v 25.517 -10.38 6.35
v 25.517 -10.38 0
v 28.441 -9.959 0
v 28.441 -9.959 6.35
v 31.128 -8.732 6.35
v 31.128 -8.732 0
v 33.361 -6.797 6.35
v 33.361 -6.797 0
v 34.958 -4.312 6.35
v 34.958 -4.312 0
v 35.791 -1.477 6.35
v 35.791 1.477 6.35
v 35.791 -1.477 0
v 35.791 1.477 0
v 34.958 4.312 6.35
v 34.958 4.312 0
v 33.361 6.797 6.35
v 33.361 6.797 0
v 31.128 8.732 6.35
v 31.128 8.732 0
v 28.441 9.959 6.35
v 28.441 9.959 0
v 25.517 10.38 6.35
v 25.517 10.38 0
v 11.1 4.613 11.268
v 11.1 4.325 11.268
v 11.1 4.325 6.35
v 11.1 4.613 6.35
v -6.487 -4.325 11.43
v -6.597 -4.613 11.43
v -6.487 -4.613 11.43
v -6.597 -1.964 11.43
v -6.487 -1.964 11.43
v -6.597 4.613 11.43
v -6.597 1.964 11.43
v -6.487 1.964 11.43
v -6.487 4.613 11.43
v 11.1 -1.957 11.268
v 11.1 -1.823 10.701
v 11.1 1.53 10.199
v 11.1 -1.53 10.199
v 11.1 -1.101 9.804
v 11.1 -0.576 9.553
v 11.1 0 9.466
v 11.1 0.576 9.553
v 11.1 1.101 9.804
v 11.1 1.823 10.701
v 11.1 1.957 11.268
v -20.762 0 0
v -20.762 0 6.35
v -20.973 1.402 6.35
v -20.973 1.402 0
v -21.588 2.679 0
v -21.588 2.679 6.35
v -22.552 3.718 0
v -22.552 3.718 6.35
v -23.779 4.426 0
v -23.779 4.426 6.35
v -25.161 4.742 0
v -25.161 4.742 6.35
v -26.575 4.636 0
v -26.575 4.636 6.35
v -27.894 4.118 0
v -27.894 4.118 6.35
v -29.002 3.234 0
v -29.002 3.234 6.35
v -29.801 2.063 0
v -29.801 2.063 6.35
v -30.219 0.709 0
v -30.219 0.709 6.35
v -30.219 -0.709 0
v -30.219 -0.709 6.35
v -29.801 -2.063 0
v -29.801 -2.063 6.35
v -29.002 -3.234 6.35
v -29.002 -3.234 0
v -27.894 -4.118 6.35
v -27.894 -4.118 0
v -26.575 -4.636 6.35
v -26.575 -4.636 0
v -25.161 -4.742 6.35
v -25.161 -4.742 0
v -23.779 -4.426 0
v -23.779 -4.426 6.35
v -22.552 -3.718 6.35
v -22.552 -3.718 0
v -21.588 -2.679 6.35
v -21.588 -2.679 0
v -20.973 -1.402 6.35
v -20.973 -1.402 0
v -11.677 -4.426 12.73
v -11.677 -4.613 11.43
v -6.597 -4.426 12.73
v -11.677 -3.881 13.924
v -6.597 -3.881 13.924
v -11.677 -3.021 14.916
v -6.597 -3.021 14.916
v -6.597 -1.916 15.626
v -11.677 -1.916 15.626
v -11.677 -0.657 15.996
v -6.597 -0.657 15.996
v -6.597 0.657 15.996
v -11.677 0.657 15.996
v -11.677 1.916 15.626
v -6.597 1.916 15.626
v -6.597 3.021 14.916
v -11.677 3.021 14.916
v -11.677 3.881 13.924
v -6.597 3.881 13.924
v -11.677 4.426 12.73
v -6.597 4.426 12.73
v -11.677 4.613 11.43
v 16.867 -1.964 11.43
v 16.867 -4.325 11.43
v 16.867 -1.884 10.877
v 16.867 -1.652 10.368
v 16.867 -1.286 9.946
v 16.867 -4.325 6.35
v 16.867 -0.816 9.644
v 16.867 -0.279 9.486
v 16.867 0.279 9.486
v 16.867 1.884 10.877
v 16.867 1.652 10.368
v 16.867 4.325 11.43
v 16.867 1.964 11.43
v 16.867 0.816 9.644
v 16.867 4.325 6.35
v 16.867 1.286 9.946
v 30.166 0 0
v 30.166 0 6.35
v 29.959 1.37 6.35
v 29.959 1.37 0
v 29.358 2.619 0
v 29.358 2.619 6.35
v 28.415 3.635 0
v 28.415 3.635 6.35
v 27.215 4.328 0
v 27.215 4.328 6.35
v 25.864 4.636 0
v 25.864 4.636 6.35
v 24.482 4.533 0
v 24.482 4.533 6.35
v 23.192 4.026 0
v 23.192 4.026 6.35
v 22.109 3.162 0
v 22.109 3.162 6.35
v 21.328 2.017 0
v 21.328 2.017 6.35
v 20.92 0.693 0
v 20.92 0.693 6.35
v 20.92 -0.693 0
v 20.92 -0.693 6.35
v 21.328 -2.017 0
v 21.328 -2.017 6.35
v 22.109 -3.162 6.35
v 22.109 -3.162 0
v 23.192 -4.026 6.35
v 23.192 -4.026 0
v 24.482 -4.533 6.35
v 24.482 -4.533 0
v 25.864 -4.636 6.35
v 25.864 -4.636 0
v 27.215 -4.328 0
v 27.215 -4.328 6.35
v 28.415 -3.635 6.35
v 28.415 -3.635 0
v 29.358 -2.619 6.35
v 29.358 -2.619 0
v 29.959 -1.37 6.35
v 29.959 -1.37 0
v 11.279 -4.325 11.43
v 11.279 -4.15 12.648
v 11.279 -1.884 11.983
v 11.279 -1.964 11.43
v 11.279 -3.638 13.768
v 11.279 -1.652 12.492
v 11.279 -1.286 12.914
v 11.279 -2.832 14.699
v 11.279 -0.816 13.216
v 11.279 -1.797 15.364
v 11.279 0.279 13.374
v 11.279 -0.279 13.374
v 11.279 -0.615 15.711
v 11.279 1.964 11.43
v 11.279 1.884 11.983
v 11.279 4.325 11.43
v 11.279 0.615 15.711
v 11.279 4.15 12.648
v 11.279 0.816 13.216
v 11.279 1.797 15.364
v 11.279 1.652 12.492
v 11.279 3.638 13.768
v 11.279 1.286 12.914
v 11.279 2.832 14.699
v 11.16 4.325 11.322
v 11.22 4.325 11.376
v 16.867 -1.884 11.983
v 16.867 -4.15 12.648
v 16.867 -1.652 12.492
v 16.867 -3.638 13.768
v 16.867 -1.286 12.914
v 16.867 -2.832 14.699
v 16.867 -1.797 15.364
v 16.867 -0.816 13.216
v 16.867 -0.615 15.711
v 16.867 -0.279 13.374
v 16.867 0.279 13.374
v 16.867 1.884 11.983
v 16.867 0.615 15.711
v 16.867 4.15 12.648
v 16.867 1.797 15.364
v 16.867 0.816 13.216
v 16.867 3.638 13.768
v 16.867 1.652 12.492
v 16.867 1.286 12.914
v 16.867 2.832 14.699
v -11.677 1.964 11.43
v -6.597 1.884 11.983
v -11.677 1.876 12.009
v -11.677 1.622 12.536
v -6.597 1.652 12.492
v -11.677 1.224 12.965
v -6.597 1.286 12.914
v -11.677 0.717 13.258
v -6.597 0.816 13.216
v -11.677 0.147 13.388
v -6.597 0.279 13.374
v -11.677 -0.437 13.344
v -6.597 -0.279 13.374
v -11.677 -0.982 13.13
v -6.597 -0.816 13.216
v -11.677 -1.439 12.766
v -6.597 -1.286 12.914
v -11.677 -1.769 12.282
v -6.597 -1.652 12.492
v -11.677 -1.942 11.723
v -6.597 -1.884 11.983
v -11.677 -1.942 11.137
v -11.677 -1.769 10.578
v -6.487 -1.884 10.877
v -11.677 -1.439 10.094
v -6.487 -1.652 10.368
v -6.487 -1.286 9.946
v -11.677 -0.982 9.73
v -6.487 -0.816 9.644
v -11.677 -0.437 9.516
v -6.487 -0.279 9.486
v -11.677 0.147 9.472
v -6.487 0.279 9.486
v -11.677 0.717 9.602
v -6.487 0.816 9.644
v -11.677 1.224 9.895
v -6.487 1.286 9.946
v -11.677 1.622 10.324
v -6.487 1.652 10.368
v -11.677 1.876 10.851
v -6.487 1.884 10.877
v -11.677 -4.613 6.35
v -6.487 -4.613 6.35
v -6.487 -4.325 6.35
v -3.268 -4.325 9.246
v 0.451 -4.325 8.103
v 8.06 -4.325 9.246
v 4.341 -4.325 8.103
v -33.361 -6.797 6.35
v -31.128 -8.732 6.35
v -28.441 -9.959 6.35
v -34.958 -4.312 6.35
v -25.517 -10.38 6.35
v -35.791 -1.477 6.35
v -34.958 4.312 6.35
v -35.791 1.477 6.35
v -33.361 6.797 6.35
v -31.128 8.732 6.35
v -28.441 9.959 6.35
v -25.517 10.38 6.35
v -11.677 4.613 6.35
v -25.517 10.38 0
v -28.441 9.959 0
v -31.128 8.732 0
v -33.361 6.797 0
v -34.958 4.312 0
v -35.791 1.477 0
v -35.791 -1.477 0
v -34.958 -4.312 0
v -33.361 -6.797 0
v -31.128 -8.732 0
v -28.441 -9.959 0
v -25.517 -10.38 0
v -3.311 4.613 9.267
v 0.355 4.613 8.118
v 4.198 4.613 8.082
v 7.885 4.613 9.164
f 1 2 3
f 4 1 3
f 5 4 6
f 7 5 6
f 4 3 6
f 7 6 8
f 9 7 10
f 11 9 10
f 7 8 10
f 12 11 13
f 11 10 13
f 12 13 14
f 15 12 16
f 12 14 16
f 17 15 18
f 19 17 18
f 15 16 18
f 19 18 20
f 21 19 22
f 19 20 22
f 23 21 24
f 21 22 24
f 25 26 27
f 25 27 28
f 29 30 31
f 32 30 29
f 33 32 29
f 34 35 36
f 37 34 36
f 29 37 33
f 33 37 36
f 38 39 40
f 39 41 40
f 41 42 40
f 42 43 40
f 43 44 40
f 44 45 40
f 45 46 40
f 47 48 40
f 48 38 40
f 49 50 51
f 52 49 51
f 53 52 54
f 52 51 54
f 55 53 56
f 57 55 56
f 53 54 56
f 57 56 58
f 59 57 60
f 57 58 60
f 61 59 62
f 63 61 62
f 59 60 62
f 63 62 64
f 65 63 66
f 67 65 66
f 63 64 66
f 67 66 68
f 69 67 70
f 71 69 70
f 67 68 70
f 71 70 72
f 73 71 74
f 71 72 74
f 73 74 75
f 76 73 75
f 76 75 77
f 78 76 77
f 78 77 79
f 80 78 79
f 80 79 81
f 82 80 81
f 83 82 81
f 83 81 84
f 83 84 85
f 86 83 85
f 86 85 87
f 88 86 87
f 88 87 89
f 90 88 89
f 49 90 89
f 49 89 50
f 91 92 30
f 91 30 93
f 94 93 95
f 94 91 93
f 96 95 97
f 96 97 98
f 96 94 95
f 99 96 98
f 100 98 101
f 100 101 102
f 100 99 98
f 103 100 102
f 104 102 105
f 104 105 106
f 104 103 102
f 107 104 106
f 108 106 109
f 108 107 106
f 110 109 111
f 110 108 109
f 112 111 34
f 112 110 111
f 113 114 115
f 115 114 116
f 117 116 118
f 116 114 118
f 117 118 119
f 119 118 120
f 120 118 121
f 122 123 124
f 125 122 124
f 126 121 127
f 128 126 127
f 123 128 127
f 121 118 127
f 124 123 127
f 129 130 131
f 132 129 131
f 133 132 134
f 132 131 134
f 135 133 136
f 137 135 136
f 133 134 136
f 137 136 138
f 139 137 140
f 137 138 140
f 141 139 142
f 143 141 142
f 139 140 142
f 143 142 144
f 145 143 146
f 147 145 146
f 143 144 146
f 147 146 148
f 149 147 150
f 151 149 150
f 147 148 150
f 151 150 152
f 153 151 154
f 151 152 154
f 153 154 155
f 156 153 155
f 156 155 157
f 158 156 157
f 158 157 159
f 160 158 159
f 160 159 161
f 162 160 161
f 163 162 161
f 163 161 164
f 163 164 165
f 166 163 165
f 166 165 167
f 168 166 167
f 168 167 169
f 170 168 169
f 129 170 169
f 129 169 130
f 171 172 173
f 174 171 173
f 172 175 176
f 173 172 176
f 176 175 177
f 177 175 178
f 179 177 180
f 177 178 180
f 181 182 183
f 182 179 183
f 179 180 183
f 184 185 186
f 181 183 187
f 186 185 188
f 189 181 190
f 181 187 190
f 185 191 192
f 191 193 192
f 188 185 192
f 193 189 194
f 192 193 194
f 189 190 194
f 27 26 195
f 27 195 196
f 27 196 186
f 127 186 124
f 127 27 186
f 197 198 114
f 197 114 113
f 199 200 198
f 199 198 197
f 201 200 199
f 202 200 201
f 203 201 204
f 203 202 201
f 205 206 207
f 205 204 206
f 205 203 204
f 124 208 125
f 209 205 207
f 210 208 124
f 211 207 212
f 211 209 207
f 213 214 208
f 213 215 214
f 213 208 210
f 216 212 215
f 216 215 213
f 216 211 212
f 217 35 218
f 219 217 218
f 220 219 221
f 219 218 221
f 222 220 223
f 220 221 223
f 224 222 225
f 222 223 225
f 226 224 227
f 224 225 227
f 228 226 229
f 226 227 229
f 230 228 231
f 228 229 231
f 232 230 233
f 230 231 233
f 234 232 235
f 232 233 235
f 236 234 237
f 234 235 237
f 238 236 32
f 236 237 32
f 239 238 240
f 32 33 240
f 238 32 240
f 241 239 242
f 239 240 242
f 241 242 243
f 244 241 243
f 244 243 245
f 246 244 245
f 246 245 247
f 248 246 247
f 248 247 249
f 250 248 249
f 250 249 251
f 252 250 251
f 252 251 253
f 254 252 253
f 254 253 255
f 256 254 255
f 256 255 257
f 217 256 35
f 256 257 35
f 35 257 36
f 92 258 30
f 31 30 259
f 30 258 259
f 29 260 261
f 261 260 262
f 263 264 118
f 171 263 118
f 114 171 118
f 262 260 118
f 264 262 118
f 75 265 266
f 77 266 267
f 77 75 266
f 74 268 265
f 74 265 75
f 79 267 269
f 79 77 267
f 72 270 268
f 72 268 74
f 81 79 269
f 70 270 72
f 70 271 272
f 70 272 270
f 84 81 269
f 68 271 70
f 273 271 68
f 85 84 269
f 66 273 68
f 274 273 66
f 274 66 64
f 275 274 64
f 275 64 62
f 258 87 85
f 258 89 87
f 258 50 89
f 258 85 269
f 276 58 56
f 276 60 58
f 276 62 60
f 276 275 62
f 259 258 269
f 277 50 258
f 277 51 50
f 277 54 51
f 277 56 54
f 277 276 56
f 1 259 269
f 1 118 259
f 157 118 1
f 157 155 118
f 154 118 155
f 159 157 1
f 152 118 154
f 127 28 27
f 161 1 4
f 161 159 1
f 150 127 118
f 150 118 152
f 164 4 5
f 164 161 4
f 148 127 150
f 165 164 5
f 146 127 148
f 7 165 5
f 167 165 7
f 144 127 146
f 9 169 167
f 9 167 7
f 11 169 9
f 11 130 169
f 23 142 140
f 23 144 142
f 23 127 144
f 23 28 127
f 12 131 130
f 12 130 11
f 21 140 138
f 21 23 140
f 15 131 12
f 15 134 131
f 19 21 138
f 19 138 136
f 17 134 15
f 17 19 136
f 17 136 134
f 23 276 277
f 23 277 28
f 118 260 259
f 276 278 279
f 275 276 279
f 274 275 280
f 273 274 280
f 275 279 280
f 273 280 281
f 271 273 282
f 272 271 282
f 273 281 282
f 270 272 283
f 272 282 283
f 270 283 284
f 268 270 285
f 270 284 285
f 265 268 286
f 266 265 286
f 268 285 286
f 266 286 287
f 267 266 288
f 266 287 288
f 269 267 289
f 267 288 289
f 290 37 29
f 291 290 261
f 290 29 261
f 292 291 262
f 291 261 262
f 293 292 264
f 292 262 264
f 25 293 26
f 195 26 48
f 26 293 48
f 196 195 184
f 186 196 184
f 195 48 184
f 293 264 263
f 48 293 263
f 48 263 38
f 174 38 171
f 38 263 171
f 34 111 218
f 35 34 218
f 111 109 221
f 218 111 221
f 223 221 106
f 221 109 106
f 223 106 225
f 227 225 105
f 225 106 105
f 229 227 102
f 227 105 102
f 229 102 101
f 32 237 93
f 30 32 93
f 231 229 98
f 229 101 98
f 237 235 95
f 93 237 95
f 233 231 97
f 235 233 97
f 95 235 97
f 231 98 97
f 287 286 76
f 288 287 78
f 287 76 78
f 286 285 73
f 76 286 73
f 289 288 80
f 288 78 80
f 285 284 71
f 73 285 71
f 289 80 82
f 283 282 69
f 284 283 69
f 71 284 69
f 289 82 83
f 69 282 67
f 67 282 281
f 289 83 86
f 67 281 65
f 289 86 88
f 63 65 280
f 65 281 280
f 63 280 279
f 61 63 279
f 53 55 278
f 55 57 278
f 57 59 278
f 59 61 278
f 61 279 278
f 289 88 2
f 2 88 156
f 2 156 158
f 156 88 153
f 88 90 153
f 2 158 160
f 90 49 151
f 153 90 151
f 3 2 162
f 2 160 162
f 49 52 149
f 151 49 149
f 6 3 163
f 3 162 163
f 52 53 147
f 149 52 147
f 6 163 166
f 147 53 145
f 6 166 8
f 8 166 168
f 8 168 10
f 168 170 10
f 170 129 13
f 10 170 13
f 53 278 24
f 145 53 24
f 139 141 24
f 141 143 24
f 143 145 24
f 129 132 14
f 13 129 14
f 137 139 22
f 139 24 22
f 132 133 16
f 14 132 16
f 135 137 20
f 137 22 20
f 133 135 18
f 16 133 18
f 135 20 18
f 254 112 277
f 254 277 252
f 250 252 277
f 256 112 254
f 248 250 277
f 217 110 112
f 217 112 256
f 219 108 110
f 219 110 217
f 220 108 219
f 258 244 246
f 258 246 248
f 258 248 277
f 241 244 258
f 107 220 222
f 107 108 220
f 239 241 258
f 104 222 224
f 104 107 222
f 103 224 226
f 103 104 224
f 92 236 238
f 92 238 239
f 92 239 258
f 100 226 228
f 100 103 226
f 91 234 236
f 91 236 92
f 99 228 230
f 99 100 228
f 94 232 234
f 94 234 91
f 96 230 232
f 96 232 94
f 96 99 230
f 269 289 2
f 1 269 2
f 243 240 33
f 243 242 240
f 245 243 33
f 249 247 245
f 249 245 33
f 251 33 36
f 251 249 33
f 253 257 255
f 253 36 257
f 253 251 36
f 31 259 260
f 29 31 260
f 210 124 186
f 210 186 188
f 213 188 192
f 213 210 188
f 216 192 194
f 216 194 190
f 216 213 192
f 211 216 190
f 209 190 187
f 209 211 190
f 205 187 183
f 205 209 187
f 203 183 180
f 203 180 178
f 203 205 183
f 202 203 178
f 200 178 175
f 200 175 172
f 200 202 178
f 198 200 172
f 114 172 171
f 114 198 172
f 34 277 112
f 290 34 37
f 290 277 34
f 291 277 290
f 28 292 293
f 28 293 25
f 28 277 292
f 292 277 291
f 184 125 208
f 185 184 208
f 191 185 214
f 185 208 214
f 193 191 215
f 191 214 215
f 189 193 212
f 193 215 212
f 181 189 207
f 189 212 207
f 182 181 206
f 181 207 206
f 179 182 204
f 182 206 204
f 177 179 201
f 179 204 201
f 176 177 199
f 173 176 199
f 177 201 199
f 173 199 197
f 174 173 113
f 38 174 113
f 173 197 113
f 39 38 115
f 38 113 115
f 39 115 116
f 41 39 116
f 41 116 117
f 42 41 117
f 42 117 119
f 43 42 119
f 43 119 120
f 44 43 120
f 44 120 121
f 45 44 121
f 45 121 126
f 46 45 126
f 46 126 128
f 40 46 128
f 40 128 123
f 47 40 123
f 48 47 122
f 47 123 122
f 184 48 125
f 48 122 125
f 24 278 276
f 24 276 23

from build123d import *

# Parameters (mm, degrees)
F0_W        = 51.033404
F0_H        = 20.759352
F1_DEPTH    = 25.4
F2_R        = 4.64909
F2_R_2      = 4.755167
F3_DEPTH    = 50.8
F1_FACE_R   = 4.755167
F1_FACE_R_2 = 4.64909
F4_DEPTH    = 19.05
F5_W        = 5.189838
F5_H        = 9.226378
F5_W_2      = 5.766489
F5_H_2      = 8.64973
F6_DEPTH    = 5.08
F8_DEPTH    = 5.08
F10_DEPTH   = 5.588
F11_R       = 1.96352
F12_DEPTH   = 50.8
F13_W       = 17.587781
F13_H       = 8.938054
F14_DEPTH   = 5.08
F16_DEPTH   = 50.8


with BuildPart() as f1:
    # F0 (on Top) → F1 (new body)
    with BuildSketch(Plane.XY):
        with BuildLine():
            ThreePointArc((-25.516702, 10.379676), (-35.896378, 0), (-25.516702, -10.379676))
            Line((-25.516702, -10.379676), (-25.516702, 10.379676))
        make_face()
        Rectangle(F0_W, F0_H)
        with BuildLine():
            Line((25.516702, 10.379676), (25.516702, -10.379676))
            ThreePointArc((25.516702, -10.379676), (35.896378, 0), (25.516702, 10.379676))
        make_face()
    extrude(amount=F1_DEPTH)

    # F2 (on face) → F3 (cut)
    with BuildSketch(Plane.XY.offset(25.4)):
        with Locations((25.516702, 0)):
            Circle(F2_R)
        with Locations((-25.516702, 0)):
            Circle(F2_R_2)
    extrude(amount=-F3_DEPTH, mode=Mode.SUBTRACT)

    # F1_face (on face) → F4 (cut)
    with BuildSketch(Plane.XY.offset(25.4)):
        with BuildLine():
            ThreePointArc((-25.516702, 10.379676), (-35.896378, 0), (-25.516702, -10.379676))
            Line((-25.516702, -10.379676), (25.516702, -10.379676))
            ThreePointArc((25.516702, -10.379676), (35.896378, 0), (25.516702, 10.379676))
            Line((25.516702, 10.379676), (-25.516702, 10.379676))
        make_face()
        with Locations((-25.516702, 0)):
            Circle(F1_FACE_R, mode=Mode.SUBTRACT)
        with Locations((25.516702, 0)):
            Circle(F1_FACE_R_2, mode=Mode.SUBTRACT)
    extrude(amount=-F4_DEPTH, mode=Mode.SUBTRACT)

    # F5 (on face) → F6 (join)
    with BuildSketch(Plane.XY.offset(6.35)):
        with Locations((-9.082216, 0)):
            Rectangle(F5_W, F5_H)
        with Locations((13.983728, 0)):
            Rectangle(F5_W_2, F5_H_2)
    extrude(amount=F6_DEPTH)

    # F7 (on face) → F8 (join)
    with BuildSketch(Plane(origin=(-11.677135, 0, 0), x_dir=(0, -1, 0), z_dir=(-1, 0, 0))):
        with BuildLine():
            Line((-4.613189, 11.43), (4.613189, 11.43))
            ThreePointArc((4.613189, 11.43), (0, 16.043189), (-4.613189, 11.43))
        make_face()
    extrude(amount=-F8_DEPTH)

    # F9 (on face) → F10 (join)
    with BuildSketch(Plane.YZ.offset(16.866973)):
        with BuildLine():
            Line((-4.324865, 11.43), (4.324865, 11.43))
            ThreePointArc((4.324865, 11.43), (0, 15.754865), (-4.324865, 11.43))
        make_face()
    extrude(amount=-F10_DEPTH)

    # F11 (on face) → F12 (cut)
    with BuildSketch(Plane.YZ.offset(16.866973)):
        with Locations((0, 11.43)):
            Circle(F11_R)
    extrude(amount=-F12_DEPTH, mode=Mode.SUBTRACT)

    # F13 (on face) → F14 (join)
    with BuildSketch(Plane.XY.offset(6.35)):
        with Locations((2.306593, 0.144162)):
            Rectangle(F13_W, F13_H)
    extrude(amount=F14_DEPTH)

    # F15 (on face) → F16 (cut)
    with BuildSketch(Plane.XZ.offset(4.324865)):
        with BuildLine():
            Line((11.278973, 11.43), (-6.487297, 11.43))
            ThreePointArc((-6.487297, 11.43), (2.395838, 7.957832), (11.278973, 11.43))
        make_face()
    extrude(amount=-F16_DEPTH, mode=Mode.SUBTRACT)


solid = f1.part
